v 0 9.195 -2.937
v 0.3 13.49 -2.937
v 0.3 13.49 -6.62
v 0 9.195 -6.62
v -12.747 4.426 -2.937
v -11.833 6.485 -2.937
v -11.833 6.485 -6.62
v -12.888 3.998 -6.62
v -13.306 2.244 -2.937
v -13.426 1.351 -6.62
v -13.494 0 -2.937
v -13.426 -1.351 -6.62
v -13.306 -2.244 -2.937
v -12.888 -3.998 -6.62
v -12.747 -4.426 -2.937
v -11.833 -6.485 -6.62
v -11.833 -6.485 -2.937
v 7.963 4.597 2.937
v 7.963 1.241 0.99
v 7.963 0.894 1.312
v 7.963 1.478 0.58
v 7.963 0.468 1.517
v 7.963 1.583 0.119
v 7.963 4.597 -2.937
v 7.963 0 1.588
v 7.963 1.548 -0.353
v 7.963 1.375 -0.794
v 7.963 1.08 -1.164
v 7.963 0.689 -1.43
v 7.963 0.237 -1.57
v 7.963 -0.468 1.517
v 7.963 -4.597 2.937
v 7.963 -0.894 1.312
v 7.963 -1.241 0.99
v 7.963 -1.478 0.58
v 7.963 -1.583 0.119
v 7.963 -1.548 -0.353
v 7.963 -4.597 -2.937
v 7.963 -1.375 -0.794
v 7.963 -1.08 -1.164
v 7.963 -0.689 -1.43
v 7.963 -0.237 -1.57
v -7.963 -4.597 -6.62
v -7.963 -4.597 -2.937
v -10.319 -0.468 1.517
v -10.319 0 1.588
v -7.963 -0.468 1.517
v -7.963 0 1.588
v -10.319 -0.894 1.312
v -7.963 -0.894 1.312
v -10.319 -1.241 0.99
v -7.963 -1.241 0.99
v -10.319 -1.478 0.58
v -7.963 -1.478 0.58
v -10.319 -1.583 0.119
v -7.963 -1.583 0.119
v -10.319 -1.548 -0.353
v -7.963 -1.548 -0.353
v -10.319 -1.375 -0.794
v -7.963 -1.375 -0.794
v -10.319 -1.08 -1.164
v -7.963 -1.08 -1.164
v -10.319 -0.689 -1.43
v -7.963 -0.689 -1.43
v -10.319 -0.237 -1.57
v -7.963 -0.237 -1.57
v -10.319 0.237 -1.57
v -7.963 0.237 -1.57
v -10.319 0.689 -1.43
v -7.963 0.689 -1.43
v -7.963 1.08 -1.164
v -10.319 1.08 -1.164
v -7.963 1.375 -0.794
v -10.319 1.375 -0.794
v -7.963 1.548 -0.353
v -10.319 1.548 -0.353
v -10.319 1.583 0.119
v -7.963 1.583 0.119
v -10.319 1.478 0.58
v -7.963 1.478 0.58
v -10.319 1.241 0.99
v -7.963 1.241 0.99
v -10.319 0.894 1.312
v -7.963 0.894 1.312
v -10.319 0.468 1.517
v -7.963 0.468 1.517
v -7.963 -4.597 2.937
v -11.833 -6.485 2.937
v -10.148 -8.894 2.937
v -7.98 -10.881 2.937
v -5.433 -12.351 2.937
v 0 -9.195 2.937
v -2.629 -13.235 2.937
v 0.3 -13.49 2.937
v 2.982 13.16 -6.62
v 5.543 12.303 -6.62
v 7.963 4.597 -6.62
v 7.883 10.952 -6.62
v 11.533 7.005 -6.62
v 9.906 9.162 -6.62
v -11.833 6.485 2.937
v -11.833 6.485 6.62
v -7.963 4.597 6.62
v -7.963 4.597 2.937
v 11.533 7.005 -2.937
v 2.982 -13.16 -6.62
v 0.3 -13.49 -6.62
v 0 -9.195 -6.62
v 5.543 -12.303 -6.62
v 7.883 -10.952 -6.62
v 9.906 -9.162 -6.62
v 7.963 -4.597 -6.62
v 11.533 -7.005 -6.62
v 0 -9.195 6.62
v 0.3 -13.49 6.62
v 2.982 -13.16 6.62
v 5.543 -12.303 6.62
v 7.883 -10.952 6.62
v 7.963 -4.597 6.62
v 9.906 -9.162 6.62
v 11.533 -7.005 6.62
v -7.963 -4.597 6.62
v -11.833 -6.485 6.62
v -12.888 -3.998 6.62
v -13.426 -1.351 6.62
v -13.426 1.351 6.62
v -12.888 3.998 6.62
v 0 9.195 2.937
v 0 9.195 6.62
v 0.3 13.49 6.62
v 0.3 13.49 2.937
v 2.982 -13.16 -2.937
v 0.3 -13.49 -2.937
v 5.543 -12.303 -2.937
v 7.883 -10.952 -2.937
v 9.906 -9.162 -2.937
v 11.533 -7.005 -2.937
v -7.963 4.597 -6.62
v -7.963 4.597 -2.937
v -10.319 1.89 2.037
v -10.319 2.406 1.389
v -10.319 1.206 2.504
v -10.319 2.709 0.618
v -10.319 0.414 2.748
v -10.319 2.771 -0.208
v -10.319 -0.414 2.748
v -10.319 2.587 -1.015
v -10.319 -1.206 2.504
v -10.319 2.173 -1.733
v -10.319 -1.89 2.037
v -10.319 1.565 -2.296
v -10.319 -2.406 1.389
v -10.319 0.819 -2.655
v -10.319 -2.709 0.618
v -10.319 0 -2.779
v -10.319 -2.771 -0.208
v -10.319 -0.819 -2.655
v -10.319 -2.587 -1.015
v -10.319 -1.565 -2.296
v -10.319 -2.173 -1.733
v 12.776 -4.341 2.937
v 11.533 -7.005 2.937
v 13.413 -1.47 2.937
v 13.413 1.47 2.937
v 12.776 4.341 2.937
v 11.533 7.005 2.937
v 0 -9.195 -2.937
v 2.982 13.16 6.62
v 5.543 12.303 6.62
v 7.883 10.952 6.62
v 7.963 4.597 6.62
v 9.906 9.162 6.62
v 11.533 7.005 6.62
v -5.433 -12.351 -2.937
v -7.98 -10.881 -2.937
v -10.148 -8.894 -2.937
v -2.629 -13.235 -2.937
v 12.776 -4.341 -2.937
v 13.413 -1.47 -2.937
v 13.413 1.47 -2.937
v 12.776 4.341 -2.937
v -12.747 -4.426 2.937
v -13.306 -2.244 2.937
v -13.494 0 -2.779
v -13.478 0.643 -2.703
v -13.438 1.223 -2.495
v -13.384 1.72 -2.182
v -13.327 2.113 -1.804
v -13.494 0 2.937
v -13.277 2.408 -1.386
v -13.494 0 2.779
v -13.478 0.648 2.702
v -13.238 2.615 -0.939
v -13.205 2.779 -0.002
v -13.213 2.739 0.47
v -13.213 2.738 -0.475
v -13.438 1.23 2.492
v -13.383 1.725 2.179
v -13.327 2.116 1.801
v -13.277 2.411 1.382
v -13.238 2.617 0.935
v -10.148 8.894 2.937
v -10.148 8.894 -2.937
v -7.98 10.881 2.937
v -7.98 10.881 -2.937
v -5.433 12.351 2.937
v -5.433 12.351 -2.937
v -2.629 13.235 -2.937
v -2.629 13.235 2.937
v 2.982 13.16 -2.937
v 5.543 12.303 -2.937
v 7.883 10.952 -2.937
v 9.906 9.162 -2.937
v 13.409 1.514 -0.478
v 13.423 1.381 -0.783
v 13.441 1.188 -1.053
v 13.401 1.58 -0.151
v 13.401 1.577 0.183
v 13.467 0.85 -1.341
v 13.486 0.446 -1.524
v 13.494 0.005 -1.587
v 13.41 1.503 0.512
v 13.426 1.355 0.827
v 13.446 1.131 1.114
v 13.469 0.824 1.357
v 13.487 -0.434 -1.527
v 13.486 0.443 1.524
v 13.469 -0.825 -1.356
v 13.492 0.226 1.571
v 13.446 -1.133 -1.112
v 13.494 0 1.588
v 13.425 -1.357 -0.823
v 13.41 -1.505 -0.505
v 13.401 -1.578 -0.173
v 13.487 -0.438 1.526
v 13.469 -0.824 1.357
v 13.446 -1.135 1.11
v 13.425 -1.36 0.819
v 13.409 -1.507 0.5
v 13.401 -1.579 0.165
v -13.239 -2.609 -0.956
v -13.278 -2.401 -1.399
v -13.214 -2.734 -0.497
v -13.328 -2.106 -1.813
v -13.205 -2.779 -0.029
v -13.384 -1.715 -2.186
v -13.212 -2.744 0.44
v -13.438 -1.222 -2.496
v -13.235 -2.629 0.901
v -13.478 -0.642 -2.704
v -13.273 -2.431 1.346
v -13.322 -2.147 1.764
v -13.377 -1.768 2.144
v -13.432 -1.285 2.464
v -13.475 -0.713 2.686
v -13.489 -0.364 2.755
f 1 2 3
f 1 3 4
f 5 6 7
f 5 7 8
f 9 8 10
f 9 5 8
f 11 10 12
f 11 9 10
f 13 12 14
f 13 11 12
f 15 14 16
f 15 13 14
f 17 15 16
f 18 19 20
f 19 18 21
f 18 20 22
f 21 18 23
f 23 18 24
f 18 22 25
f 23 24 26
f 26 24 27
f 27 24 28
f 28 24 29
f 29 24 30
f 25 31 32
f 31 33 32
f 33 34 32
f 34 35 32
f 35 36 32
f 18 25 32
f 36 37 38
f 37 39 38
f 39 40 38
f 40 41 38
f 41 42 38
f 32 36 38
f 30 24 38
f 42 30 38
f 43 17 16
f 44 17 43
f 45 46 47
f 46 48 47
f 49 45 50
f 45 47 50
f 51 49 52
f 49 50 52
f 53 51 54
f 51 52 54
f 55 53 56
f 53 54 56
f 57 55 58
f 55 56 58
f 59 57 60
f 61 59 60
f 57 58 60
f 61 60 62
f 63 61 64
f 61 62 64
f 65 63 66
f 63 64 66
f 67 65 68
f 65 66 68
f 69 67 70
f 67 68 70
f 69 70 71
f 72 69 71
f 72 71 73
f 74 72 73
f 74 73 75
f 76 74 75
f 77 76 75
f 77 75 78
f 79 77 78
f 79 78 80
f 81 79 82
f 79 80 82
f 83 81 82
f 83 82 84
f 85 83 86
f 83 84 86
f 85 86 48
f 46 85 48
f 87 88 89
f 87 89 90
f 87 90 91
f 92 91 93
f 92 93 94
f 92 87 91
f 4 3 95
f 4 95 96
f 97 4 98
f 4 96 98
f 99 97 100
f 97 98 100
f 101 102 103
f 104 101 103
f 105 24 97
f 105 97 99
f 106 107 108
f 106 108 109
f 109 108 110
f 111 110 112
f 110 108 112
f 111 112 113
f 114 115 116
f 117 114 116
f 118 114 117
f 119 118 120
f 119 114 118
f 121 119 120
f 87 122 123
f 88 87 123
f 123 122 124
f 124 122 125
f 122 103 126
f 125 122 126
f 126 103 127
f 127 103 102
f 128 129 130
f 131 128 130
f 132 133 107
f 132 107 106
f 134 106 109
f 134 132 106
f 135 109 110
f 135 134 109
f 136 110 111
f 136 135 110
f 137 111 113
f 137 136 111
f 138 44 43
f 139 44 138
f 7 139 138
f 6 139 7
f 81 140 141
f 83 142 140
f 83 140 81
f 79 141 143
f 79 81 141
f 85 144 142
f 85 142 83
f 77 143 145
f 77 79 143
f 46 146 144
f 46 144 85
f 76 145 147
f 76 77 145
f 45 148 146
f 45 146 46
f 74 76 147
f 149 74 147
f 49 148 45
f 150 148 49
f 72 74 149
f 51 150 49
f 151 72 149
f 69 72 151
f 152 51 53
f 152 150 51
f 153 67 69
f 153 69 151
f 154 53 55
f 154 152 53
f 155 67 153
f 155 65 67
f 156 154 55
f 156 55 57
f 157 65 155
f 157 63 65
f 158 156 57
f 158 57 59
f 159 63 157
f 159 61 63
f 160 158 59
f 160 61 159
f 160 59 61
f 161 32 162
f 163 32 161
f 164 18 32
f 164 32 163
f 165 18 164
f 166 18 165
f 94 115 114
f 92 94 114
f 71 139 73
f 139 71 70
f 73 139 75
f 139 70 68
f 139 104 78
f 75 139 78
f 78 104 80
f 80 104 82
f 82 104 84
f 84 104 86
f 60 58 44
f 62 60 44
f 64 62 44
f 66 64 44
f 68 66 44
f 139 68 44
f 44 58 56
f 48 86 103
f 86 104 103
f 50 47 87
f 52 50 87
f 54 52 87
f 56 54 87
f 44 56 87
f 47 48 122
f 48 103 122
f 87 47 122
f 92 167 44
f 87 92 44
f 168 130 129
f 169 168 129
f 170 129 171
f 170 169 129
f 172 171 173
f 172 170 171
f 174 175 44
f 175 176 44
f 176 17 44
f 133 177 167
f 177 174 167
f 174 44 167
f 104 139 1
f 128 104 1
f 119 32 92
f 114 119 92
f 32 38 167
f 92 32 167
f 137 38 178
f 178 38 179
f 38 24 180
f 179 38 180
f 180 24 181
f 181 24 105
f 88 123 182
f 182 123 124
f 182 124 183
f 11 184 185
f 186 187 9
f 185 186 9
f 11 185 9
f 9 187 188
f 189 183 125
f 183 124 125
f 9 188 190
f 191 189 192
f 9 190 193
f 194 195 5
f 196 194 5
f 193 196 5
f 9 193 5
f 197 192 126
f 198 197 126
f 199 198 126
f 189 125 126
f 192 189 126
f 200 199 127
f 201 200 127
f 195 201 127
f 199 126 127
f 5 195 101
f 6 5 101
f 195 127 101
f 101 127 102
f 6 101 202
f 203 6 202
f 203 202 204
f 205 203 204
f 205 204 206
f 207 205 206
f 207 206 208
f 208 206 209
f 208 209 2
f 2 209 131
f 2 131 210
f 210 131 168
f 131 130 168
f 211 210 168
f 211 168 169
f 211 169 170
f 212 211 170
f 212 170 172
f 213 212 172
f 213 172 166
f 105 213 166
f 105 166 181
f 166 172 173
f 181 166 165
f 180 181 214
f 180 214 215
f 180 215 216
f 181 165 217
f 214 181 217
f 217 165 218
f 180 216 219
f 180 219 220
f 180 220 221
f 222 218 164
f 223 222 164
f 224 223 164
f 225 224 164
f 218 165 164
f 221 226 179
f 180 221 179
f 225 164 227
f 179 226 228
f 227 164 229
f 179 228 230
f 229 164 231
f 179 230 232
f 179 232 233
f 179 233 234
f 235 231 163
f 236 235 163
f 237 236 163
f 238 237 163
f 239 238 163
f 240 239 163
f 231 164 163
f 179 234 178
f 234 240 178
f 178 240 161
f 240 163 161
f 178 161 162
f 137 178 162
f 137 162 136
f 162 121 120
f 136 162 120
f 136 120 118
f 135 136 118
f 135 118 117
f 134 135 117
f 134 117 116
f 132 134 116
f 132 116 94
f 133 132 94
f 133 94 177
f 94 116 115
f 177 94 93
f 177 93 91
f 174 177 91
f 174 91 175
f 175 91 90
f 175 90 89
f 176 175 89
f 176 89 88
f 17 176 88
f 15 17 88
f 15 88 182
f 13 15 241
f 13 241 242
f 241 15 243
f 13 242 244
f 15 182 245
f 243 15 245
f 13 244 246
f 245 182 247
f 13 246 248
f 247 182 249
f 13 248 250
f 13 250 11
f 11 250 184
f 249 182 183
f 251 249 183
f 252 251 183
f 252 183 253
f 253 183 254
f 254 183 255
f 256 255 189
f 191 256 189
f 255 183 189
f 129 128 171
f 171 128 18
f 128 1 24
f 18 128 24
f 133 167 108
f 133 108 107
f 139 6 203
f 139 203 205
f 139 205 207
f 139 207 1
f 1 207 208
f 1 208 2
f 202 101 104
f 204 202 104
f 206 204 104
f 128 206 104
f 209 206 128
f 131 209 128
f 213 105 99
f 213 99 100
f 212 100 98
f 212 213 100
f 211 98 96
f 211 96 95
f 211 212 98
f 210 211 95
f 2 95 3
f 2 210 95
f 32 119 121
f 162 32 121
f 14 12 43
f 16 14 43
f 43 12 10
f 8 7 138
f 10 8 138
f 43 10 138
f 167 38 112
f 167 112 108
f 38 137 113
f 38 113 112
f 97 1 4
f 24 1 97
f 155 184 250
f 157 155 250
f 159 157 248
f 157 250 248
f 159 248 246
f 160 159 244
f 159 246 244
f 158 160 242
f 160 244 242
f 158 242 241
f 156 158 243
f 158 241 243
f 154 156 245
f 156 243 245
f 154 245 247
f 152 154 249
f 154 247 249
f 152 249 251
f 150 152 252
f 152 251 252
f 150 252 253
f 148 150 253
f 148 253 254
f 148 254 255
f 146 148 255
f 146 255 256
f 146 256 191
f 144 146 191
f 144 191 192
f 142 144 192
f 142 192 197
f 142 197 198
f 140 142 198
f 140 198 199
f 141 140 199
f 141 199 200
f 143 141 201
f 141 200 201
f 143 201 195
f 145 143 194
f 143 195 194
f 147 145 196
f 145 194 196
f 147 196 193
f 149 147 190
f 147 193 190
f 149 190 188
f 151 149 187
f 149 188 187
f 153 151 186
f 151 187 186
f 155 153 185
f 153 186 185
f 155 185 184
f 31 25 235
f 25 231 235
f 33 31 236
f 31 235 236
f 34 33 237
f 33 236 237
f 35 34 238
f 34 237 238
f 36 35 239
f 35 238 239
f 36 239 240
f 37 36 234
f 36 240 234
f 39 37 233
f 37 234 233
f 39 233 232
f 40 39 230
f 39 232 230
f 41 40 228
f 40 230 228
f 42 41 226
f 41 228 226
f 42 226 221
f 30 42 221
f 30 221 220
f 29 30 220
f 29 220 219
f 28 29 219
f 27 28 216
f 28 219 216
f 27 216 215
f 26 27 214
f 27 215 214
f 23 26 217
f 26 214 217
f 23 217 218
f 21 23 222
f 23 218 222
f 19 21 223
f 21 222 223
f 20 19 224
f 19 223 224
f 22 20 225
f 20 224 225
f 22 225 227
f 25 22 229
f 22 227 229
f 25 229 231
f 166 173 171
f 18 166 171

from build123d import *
from build123d.topology import SkipClean

# Parameters (mm, degrees)
SKETCH1_W                = 13.493749999999999
SKETCH1_H                = 9.55675
CUT_EXTRUDE1_DEPTH       = 3.683
CUT_EXTRUDE2_DEPTH       = 3.683
CUT_EXTRUDE3_DEPTH       = 22.342306545626695
BOSS_EXTRUDE1_START      = 3.6830000000000003
BOSS_EXTRUDE1_DEPTH      = 3.6830000000000003
BOSS_EXTRUDE2_DEPTH      = 3.683
BOSS_EXTRUDE3_DEPTH      = 3.683
BOSS_EXTRUDE4_DEPTH      = 3.6830000000000007
M2_CLEARANCE_HOLE1_D     = 2.2606
M2_CLEARANCE_HOLE1_DEPTH = 5.530875
HOLE1_D                  = 3.175
HOLE1_DEPTH              = 26.987525
HOLE1_CBORE_D            = 5.55752
HOLE1_CBORE_DEPTH        = 3.175


with BuildPart() as part:
    # Sketch1 → Revolve1 (revolve)
    with BuildSketch(Plane.XZ, mode=Mode.PRIVATE) as revolve1_sk:
        with Locations((6.746874999999999, 1.8414999999999997)):
            Rectangle(SKETCH1_W, SKETCH1_H)
    revolve(revolve1_sk.sketch.rotate(Axis((0, 0, 6.6198749999999995), (0, 0, -1)), 180), axis=Axis((0, 0, 6.6198749999999995), (0, 0, -1)))

    # Sketch2 → Cut-Extrude1 (cut)
    with BuildSketch(Plane.XY.offset(6.6198749999999995)):
        with BuildLine():
            Line((11.532844262672493, 7.005340268355434), (1.1470002096581853, 6.94e-15))
            Line((1.1470002096581853, 6.94e-15), (11.532844262672493, -7.005340268355431))
            ThreePointArc((11.532844262672493, -7.005340268355431), (13.493749999999999, 1.5e-15), (11.532844262672493, 7.005340268355434))
        make_face()
    extrude(amount=-CUT_EXTRUDE1_DEPTH, mode=Mode.SUBTRACT)

    # Sketch3 → Cut-Extrude2 (cut)
    with BuildSketch(Plane.XY.offset(6.6198749999999995)):
        with BuildLine():
            Line((-0.6429605972199295, -9.714e-14), (0.3003805032135874, 13.490406243541708))
            ThreePointArc((0.3003805032135874, 13.490406243541708), (-13.493749999999999, 1.65e-15), (0.3003805032135965, -13.49040624354171))
            Line((0.3003805032135965, -13.49040624354171), (-0.6429605972199295, -9.714e-14))
        make_face()
    extrude(amount=-CUT_EXTRUDE2_DEPTH, mode=Mode.SUBTRACT)

    # Sketch4 → Cut-Extrude3 (cut, through all)
    with BuildSketch(Plane(origin=(0, 0, -2.936875), x_dir=(-1, 0, 0), z_dir=(0, 0, -1))):
        Polygon((-7.9628999999999985, -4.597382458530073), (0, -9.19476491706014), (7.962900000000002, -4.597382458530068), (7.962900000000002, 4.597382458530077), (-5.2e-15, 9.194764917060152), (-7.962899999999997, 4.5973824585300775), align=None)
    extrude(amount=-CUT_EXTRUDE3_DEPTH, mode=Mode.SUBTRACT)

    # Sketch5 → Boss-Extrude1 (add)
    with BuildSketch(Plane.XY.offset(2.936875).offset(BOSS_EXTRUDE1_START)):
        with BuildLine():
            Line((-11.833224765886177, 6.485065975186222), (-7.962900000000002, 4.597382458530077))
            Line((-7.962900000000002, 4.597382458530077), (-7.962900000000002, -4.597382458530068))
            Line((-7.962900000000002, -4.597382458530068), (-11.833224765886175, -6.485065975186225))
            ThreePointArc((-11.833224765886175, -6.485065975186225), (-13.49375, -1.65e-15), (-11.833224765886177, 6.485065975186222))
        make_face()
    extrude(amount=-BOSS_EXTRUDE1_DEPTH)

    # Sketch6 → Boss-Extrude2 (add)
    with SkipClean():  # the faces are left unmerged after this step: merging them gives an invalid solid
        with BuildSketch(Plane(origin=(0, 0, -2.936875), x_dir=(-1, 0, 0), z_dir=(0, 0, -1))):
            with BuildLine():
                Line((0, 9.194764917060148), (-7.962899999999997, 4.5973824585300775))
                Line((-7.962899999999997, 4.5973824585300775), (-11.53284426267249, 7.005340268355432))
                ThreePointArc((-11.53284426267249, 7.005340268355432), (-6.746874999999971, 11.685930292316284), (-0.30038050321358717, 13.490406243541708))
                Line((-0.30038050321358717, 13.490406243541708), (0, 9.194764917060148))
            make_face()
        extrude(amount=BOSS_EXTRUDE2_DEPTH)

    # Sketch7 → Boss-Extrude3 (add)
    with SkipClean():  # the faces are left unmerged after this step: merging them gives an invalid solid
        with BuildSketch(Plane(origin=(0, 0, -2.936875), x_dir=(-1, 0, 0), z_dir=(0, 0, -1))):
            with BuildLine():
                Line((11.833224765886175, -6.485065975186224), (7.962900000000002, -4.597382458530068))
                Line((7.962900000000002, -4.597382458530068), (7.962900000000002, 4.597382458530077))
                Line((7.962900000000002, 4.597382458530077), (11.833224765886177, 6.485065975186222))
                ThreePointArc((11.833224765886177, 6.485065975186222), (13.49375, 0), (11.833224765886175, -6.485065975186224))
            make_face()
        extrude(amount=BOSS_EXTRUDE3_DEPTH)

    # Sketch8 → Boss-Extrude4 (add)
    with SkipClean():  # the faces are left unmerged after this step: merging them gives an invalid solid
        with BuildSketch(Plane(origin=(0, 0, -2.936875), x_dir=(-1, 0, 0), z_dir=(0, 0, -1))):
            with BuildLine():
                Line((-11.532844262672493, -7.005340268355434), (-7.9628999999999985, -4.597382458530073))
                Line((-7.9628999999999985, -4.597382458530073), (0, -9.19476491706014))
                Line((0, -9.19476491706014), (-0.30038050321359694, -13.49040624354171))
                ThreePointArc((-0.30038050321359694, -13.49040624354171), (-6.746874999999972, -11.685930292316286), (-11.532844262672493, -7.005340268355434))
            make_face()
        extrude(amount=BOSS_EXTRUDE4_DEPTH)

    # M2 Clearance Hole1
    with Locations(Plane.ZY.offset(-7.9628999999999985)):
        with Locations((0, 0)):
            Hole(M2_CLEARANCE_HOLE1_D / 2, depth=M2_CLEARANCE_HOLE1_DEPTH)

    # Hole1
    with Locations(Plane(origin=(-13.49375, 0, 0), x_dir=(0, 0, -1), z_dir=(-1, 0, 0))):
        with Locations((0, 0)):
            CounterBoreHole(HOLE1_D / 2, HOLE1_CBORE_D / 2, HOLE1_CBORE_DEPTH, depth=HOLE1_DEPTH)


solid = part.part
